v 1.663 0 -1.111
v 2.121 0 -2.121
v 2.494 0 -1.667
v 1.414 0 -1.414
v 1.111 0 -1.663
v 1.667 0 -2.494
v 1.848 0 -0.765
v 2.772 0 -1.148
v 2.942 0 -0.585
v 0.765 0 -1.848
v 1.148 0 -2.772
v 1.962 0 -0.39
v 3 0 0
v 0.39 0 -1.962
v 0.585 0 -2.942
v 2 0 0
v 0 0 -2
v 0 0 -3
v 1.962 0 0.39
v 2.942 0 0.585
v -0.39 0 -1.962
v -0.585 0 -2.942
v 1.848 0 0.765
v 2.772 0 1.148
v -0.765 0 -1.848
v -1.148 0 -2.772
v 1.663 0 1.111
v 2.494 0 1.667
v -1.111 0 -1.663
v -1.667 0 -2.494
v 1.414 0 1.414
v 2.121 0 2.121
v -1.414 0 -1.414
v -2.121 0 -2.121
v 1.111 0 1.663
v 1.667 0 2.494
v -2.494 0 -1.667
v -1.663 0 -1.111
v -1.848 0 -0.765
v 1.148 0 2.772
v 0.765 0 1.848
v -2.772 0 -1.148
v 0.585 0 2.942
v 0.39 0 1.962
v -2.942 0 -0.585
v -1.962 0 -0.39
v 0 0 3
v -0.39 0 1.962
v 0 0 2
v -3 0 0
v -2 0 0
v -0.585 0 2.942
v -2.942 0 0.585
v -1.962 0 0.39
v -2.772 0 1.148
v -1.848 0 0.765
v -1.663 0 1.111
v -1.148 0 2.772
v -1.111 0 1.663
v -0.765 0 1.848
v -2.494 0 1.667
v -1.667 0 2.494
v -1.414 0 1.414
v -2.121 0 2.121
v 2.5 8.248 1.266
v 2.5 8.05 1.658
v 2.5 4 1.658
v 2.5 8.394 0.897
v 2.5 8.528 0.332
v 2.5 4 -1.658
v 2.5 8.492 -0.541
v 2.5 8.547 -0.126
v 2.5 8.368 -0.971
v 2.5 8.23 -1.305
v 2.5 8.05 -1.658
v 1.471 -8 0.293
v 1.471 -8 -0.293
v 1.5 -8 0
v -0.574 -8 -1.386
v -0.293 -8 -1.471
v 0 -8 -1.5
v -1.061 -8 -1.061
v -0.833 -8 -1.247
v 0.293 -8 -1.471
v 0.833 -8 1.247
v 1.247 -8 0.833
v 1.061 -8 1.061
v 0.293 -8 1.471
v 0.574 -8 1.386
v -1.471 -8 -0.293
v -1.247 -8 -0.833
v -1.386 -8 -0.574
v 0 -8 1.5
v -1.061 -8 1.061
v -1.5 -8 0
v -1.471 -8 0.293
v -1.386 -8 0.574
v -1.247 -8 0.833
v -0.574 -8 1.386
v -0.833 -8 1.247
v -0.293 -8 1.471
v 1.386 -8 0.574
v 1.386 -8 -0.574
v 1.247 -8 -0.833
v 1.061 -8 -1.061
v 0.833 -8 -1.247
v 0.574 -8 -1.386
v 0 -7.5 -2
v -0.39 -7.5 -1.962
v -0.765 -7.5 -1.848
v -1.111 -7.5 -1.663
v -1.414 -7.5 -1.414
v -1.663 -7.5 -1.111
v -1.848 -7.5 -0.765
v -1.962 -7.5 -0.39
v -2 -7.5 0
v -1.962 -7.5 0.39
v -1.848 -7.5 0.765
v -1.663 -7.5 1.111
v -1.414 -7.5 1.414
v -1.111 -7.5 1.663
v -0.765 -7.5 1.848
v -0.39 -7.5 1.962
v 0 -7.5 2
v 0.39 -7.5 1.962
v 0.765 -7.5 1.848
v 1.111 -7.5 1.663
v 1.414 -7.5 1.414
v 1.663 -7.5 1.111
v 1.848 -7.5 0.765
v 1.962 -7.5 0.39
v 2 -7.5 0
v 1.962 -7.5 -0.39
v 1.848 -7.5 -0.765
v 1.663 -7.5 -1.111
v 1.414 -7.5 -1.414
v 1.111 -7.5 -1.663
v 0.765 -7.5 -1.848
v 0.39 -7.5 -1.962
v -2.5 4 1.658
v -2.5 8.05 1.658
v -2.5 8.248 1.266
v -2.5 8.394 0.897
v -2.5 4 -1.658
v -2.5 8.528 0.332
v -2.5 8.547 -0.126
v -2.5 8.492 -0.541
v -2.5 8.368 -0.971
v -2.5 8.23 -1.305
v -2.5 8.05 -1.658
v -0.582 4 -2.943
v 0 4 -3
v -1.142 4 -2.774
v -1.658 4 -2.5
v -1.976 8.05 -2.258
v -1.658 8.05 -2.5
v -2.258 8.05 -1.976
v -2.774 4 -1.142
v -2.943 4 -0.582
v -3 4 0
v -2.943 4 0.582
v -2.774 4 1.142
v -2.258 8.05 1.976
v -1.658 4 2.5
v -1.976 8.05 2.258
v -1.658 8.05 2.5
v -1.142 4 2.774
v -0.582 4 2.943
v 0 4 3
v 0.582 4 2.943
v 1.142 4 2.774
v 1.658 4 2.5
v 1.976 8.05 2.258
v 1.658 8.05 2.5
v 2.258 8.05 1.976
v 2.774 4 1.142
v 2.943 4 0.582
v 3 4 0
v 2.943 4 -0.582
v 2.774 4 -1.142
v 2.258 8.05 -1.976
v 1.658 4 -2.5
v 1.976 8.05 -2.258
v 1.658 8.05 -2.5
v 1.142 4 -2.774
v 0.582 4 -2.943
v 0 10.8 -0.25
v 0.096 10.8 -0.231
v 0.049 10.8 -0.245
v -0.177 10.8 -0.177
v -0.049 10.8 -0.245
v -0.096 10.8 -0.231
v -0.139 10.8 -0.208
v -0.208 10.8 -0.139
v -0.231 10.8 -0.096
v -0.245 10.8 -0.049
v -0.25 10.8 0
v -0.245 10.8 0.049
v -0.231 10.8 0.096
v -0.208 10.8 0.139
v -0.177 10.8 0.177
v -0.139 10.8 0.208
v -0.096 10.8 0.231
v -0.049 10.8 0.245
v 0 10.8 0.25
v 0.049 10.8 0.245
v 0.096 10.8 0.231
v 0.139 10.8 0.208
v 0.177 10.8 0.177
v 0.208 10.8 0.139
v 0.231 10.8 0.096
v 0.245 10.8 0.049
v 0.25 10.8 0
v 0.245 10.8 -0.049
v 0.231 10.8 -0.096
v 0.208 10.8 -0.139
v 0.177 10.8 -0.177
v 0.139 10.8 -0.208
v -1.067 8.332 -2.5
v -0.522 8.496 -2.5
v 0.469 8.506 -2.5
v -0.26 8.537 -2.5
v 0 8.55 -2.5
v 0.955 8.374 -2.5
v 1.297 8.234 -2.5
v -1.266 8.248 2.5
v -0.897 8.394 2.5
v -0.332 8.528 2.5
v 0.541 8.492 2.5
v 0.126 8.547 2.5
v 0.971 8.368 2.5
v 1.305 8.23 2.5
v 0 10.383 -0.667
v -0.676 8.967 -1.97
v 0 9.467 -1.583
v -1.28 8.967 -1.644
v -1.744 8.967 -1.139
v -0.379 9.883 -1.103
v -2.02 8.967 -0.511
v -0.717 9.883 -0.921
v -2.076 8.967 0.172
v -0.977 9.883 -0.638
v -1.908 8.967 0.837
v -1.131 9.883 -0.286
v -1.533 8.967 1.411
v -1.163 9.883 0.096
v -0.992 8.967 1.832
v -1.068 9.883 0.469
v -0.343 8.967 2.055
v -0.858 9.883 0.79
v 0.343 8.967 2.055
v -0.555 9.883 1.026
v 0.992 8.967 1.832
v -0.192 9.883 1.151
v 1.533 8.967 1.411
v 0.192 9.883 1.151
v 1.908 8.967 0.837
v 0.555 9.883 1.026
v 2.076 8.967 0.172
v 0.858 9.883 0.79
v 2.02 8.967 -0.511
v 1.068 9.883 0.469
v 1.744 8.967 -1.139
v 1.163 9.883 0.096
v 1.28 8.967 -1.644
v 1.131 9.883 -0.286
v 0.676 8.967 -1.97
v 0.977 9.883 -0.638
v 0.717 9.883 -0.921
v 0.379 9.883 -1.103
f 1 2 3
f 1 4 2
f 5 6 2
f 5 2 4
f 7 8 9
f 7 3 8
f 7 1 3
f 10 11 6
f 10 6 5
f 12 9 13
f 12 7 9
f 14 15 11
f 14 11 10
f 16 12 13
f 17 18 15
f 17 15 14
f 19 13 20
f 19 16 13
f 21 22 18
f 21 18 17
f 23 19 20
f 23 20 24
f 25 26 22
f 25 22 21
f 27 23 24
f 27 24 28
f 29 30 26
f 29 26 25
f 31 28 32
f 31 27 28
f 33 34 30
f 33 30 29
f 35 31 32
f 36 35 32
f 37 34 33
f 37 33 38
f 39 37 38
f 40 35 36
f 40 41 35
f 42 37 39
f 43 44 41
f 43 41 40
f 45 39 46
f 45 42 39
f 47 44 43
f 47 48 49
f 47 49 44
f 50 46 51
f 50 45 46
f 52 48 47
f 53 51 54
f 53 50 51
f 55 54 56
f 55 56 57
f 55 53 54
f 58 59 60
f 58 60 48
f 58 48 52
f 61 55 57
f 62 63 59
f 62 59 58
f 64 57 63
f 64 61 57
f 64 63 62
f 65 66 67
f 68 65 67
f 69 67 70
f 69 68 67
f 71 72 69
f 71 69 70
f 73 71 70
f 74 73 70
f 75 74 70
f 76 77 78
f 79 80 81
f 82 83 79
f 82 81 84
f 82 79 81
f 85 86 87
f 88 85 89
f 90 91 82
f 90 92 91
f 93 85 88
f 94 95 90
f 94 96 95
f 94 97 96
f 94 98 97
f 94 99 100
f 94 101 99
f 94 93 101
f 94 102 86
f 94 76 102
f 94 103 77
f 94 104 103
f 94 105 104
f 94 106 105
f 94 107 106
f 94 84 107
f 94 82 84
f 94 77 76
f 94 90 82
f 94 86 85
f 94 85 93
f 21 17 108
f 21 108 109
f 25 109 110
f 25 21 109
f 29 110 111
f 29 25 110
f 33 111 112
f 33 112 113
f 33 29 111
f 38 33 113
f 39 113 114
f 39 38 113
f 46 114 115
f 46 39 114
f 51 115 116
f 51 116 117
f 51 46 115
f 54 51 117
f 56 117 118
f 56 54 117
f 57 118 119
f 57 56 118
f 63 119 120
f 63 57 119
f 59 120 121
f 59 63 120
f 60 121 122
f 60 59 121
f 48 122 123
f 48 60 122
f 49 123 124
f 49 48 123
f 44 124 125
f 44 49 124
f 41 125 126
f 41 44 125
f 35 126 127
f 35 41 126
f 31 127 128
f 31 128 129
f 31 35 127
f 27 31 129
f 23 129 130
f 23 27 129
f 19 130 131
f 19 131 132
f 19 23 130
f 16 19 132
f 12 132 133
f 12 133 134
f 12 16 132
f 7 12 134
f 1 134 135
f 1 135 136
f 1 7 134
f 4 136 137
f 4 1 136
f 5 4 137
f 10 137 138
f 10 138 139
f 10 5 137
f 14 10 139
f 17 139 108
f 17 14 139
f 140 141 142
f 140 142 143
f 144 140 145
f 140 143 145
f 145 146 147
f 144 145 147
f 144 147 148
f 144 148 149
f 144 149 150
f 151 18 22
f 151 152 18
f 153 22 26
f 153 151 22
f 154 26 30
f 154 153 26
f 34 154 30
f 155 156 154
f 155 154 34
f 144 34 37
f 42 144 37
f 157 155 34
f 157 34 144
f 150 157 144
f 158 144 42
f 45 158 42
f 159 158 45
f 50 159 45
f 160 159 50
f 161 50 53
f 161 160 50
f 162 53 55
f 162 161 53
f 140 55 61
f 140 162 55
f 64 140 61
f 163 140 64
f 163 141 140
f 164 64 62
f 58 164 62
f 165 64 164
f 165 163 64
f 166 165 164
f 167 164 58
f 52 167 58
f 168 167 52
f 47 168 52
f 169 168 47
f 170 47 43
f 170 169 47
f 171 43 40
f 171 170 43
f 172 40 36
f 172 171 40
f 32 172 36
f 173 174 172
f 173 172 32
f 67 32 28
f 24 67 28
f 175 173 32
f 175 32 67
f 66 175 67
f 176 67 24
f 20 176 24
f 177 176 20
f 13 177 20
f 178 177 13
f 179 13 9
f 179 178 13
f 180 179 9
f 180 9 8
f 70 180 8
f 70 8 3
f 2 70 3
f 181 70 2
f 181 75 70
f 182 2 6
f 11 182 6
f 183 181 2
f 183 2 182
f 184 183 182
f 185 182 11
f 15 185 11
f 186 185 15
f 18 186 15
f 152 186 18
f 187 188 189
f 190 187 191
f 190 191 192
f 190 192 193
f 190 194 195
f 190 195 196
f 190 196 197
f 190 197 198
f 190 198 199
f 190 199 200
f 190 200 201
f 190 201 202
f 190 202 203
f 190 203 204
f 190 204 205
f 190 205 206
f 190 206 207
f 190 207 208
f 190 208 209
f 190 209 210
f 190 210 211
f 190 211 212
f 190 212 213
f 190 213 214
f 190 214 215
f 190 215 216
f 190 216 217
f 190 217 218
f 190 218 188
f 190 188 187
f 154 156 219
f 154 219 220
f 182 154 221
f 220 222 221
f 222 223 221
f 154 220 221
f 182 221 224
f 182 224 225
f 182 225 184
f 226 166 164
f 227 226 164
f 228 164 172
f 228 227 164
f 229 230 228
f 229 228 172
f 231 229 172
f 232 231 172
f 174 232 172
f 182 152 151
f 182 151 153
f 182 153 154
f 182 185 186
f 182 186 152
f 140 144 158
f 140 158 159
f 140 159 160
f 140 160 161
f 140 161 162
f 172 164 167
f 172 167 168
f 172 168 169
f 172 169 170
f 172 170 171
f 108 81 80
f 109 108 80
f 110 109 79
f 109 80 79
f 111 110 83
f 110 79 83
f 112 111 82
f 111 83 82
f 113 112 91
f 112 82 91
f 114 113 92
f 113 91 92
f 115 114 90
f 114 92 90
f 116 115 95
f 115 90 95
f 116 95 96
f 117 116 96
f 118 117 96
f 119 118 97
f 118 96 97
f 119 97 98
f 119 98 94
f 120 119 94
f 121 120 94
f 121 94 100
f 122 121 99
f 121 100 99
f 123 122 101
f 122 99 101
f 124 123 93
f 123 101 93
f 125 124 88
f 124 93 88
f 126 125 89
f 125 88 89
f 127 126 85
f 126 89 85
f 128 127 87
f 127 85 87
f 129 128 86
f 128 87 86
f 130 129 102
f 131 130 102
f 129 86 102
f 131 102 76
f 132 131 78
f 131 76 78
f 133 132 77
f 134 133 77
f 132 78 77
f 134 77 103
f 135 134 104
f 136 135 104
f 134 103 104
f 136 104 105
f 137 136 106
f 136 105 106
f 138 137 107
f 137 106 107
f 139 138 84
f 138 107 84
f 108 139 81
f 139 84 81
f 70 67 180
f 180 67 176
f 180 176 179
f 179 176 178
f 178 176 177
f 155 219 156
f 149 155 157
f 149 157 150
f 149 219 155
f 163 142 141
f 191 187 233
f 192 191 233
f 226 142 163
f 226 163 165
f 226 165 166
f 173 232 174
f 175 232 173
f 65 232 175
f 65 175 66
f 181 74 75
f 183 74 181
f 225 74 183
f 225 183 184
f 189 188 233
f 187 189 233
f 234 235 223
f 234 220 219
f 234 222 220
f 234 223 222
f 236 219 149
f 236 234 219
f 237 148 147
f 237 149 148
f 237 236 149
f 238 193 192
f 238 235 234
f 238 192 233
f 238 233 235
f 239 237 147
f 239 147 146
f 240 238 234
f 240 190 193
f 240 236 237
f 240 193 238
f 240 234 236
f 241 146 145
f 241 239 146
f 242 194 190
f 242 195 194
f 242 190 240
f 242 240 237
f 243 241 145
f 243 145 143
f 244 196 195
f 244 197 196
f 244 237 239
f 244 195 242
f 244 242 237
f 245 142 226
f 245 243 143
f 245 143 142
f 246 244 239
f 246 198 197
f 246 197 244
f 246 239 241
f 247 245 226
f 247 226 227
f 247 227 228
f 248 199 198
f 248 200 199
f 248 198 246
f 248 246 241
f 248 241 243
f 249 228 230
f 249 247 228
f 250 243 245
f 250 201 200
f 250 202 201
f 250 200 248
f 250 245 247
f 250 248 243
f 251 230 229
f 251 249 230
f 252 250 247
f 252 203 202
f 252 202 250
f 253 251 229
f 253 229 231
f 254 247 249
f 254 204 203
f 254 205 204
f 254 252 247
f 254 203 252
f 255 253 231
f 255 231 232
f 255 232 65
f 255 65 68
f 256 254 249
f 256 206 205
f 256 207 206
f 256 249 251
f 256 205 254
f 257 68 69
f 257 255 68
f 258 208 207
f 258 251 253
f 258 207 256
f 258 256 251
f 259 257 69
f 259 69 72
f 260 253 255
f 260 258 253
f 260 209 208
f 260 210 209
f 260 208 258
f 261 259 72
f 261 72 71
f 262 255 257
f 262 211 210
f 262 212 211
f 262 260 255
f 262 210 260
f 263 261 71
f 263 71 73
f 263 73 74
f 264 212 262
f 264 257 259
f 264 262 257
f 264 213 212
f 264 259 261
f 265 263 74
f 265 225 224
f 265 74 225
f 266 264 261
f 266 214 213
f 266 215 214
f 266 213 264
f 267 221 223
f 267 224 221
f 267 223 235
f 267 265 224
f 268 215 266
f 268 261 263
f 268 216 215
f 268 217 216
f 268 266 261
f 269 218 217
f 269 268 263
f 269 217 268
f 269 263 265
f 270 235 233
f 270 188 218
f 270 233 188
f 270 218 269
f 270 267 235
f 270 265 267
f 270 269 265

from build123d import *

# Parameters (mm, degrees)
CHAMFER1_SIZE       = 2.75
SKETCH2_OUTSIDE_W   = 12.126
SKETCH2_OUTSIDE_H   = 12.126
SKETCH2_OUTSIDE_W_2 = 5
SKETCH2_OUTSIDE_H_2 = 5
CUT_EXTRUDE1_DEPTH  = 6.8
CHAMFER2_SIZE       = 0.5


with BuildPart() as part:
    # Sketch1 → Revolve1 (revolve)
    with BuildSketch(Plane.XY, mode=Mode.PRIVATE) as revolve1_sk:
        Polygon((0, -8), (2, -8), (2, 0), (3, 0), (3, 10.8), (0, 10.8), align=None)
    revolve(revolve1_sk.sketch.rotate(Axis((0, -10.593240764, 0), (0, 1, 0)), 90), axis=Axis((0, -10.593240764, 0), (0, 1, 0)))

    # Chamfer1
    chamfer1_edges = [part.edges().sort_by_distance(p)[0] for p in [
        (0, 10.8, 3),
    ]]
    chamfer(chamfer1_edges, length=CHAMFER1_SIZE)

    # Sketch2 outside → Cut-Extrude1 (cut)
    with BuildSketch(Plane(origin=(0, 10.8, 0), x_dir=(1, 0, 0), z_dir=(0, 1, 0))):
        Rectangle(SKETCH2_OUTSIDE_W, SKETCH2_OUTSIDE_H)
        Rectangle(SKETCH2_OUTSIDE_W_2, SKETCH2_OUTSIDE_H_2, mode=Mode.SUBTRACT)
    extrude(amount=-CUT_EXTRUDE1_DEPTH, mode=Mode.SUBTRACT)

    # Chamfer2
    chamfer2_edges = [part.edges().sort_by_distance(p)[0] for p in [
        (0, -8, 2),
    ]]
    chamfer(chamfer2_edges, length=CHAMFER2_SIZE)


solid = part.part
